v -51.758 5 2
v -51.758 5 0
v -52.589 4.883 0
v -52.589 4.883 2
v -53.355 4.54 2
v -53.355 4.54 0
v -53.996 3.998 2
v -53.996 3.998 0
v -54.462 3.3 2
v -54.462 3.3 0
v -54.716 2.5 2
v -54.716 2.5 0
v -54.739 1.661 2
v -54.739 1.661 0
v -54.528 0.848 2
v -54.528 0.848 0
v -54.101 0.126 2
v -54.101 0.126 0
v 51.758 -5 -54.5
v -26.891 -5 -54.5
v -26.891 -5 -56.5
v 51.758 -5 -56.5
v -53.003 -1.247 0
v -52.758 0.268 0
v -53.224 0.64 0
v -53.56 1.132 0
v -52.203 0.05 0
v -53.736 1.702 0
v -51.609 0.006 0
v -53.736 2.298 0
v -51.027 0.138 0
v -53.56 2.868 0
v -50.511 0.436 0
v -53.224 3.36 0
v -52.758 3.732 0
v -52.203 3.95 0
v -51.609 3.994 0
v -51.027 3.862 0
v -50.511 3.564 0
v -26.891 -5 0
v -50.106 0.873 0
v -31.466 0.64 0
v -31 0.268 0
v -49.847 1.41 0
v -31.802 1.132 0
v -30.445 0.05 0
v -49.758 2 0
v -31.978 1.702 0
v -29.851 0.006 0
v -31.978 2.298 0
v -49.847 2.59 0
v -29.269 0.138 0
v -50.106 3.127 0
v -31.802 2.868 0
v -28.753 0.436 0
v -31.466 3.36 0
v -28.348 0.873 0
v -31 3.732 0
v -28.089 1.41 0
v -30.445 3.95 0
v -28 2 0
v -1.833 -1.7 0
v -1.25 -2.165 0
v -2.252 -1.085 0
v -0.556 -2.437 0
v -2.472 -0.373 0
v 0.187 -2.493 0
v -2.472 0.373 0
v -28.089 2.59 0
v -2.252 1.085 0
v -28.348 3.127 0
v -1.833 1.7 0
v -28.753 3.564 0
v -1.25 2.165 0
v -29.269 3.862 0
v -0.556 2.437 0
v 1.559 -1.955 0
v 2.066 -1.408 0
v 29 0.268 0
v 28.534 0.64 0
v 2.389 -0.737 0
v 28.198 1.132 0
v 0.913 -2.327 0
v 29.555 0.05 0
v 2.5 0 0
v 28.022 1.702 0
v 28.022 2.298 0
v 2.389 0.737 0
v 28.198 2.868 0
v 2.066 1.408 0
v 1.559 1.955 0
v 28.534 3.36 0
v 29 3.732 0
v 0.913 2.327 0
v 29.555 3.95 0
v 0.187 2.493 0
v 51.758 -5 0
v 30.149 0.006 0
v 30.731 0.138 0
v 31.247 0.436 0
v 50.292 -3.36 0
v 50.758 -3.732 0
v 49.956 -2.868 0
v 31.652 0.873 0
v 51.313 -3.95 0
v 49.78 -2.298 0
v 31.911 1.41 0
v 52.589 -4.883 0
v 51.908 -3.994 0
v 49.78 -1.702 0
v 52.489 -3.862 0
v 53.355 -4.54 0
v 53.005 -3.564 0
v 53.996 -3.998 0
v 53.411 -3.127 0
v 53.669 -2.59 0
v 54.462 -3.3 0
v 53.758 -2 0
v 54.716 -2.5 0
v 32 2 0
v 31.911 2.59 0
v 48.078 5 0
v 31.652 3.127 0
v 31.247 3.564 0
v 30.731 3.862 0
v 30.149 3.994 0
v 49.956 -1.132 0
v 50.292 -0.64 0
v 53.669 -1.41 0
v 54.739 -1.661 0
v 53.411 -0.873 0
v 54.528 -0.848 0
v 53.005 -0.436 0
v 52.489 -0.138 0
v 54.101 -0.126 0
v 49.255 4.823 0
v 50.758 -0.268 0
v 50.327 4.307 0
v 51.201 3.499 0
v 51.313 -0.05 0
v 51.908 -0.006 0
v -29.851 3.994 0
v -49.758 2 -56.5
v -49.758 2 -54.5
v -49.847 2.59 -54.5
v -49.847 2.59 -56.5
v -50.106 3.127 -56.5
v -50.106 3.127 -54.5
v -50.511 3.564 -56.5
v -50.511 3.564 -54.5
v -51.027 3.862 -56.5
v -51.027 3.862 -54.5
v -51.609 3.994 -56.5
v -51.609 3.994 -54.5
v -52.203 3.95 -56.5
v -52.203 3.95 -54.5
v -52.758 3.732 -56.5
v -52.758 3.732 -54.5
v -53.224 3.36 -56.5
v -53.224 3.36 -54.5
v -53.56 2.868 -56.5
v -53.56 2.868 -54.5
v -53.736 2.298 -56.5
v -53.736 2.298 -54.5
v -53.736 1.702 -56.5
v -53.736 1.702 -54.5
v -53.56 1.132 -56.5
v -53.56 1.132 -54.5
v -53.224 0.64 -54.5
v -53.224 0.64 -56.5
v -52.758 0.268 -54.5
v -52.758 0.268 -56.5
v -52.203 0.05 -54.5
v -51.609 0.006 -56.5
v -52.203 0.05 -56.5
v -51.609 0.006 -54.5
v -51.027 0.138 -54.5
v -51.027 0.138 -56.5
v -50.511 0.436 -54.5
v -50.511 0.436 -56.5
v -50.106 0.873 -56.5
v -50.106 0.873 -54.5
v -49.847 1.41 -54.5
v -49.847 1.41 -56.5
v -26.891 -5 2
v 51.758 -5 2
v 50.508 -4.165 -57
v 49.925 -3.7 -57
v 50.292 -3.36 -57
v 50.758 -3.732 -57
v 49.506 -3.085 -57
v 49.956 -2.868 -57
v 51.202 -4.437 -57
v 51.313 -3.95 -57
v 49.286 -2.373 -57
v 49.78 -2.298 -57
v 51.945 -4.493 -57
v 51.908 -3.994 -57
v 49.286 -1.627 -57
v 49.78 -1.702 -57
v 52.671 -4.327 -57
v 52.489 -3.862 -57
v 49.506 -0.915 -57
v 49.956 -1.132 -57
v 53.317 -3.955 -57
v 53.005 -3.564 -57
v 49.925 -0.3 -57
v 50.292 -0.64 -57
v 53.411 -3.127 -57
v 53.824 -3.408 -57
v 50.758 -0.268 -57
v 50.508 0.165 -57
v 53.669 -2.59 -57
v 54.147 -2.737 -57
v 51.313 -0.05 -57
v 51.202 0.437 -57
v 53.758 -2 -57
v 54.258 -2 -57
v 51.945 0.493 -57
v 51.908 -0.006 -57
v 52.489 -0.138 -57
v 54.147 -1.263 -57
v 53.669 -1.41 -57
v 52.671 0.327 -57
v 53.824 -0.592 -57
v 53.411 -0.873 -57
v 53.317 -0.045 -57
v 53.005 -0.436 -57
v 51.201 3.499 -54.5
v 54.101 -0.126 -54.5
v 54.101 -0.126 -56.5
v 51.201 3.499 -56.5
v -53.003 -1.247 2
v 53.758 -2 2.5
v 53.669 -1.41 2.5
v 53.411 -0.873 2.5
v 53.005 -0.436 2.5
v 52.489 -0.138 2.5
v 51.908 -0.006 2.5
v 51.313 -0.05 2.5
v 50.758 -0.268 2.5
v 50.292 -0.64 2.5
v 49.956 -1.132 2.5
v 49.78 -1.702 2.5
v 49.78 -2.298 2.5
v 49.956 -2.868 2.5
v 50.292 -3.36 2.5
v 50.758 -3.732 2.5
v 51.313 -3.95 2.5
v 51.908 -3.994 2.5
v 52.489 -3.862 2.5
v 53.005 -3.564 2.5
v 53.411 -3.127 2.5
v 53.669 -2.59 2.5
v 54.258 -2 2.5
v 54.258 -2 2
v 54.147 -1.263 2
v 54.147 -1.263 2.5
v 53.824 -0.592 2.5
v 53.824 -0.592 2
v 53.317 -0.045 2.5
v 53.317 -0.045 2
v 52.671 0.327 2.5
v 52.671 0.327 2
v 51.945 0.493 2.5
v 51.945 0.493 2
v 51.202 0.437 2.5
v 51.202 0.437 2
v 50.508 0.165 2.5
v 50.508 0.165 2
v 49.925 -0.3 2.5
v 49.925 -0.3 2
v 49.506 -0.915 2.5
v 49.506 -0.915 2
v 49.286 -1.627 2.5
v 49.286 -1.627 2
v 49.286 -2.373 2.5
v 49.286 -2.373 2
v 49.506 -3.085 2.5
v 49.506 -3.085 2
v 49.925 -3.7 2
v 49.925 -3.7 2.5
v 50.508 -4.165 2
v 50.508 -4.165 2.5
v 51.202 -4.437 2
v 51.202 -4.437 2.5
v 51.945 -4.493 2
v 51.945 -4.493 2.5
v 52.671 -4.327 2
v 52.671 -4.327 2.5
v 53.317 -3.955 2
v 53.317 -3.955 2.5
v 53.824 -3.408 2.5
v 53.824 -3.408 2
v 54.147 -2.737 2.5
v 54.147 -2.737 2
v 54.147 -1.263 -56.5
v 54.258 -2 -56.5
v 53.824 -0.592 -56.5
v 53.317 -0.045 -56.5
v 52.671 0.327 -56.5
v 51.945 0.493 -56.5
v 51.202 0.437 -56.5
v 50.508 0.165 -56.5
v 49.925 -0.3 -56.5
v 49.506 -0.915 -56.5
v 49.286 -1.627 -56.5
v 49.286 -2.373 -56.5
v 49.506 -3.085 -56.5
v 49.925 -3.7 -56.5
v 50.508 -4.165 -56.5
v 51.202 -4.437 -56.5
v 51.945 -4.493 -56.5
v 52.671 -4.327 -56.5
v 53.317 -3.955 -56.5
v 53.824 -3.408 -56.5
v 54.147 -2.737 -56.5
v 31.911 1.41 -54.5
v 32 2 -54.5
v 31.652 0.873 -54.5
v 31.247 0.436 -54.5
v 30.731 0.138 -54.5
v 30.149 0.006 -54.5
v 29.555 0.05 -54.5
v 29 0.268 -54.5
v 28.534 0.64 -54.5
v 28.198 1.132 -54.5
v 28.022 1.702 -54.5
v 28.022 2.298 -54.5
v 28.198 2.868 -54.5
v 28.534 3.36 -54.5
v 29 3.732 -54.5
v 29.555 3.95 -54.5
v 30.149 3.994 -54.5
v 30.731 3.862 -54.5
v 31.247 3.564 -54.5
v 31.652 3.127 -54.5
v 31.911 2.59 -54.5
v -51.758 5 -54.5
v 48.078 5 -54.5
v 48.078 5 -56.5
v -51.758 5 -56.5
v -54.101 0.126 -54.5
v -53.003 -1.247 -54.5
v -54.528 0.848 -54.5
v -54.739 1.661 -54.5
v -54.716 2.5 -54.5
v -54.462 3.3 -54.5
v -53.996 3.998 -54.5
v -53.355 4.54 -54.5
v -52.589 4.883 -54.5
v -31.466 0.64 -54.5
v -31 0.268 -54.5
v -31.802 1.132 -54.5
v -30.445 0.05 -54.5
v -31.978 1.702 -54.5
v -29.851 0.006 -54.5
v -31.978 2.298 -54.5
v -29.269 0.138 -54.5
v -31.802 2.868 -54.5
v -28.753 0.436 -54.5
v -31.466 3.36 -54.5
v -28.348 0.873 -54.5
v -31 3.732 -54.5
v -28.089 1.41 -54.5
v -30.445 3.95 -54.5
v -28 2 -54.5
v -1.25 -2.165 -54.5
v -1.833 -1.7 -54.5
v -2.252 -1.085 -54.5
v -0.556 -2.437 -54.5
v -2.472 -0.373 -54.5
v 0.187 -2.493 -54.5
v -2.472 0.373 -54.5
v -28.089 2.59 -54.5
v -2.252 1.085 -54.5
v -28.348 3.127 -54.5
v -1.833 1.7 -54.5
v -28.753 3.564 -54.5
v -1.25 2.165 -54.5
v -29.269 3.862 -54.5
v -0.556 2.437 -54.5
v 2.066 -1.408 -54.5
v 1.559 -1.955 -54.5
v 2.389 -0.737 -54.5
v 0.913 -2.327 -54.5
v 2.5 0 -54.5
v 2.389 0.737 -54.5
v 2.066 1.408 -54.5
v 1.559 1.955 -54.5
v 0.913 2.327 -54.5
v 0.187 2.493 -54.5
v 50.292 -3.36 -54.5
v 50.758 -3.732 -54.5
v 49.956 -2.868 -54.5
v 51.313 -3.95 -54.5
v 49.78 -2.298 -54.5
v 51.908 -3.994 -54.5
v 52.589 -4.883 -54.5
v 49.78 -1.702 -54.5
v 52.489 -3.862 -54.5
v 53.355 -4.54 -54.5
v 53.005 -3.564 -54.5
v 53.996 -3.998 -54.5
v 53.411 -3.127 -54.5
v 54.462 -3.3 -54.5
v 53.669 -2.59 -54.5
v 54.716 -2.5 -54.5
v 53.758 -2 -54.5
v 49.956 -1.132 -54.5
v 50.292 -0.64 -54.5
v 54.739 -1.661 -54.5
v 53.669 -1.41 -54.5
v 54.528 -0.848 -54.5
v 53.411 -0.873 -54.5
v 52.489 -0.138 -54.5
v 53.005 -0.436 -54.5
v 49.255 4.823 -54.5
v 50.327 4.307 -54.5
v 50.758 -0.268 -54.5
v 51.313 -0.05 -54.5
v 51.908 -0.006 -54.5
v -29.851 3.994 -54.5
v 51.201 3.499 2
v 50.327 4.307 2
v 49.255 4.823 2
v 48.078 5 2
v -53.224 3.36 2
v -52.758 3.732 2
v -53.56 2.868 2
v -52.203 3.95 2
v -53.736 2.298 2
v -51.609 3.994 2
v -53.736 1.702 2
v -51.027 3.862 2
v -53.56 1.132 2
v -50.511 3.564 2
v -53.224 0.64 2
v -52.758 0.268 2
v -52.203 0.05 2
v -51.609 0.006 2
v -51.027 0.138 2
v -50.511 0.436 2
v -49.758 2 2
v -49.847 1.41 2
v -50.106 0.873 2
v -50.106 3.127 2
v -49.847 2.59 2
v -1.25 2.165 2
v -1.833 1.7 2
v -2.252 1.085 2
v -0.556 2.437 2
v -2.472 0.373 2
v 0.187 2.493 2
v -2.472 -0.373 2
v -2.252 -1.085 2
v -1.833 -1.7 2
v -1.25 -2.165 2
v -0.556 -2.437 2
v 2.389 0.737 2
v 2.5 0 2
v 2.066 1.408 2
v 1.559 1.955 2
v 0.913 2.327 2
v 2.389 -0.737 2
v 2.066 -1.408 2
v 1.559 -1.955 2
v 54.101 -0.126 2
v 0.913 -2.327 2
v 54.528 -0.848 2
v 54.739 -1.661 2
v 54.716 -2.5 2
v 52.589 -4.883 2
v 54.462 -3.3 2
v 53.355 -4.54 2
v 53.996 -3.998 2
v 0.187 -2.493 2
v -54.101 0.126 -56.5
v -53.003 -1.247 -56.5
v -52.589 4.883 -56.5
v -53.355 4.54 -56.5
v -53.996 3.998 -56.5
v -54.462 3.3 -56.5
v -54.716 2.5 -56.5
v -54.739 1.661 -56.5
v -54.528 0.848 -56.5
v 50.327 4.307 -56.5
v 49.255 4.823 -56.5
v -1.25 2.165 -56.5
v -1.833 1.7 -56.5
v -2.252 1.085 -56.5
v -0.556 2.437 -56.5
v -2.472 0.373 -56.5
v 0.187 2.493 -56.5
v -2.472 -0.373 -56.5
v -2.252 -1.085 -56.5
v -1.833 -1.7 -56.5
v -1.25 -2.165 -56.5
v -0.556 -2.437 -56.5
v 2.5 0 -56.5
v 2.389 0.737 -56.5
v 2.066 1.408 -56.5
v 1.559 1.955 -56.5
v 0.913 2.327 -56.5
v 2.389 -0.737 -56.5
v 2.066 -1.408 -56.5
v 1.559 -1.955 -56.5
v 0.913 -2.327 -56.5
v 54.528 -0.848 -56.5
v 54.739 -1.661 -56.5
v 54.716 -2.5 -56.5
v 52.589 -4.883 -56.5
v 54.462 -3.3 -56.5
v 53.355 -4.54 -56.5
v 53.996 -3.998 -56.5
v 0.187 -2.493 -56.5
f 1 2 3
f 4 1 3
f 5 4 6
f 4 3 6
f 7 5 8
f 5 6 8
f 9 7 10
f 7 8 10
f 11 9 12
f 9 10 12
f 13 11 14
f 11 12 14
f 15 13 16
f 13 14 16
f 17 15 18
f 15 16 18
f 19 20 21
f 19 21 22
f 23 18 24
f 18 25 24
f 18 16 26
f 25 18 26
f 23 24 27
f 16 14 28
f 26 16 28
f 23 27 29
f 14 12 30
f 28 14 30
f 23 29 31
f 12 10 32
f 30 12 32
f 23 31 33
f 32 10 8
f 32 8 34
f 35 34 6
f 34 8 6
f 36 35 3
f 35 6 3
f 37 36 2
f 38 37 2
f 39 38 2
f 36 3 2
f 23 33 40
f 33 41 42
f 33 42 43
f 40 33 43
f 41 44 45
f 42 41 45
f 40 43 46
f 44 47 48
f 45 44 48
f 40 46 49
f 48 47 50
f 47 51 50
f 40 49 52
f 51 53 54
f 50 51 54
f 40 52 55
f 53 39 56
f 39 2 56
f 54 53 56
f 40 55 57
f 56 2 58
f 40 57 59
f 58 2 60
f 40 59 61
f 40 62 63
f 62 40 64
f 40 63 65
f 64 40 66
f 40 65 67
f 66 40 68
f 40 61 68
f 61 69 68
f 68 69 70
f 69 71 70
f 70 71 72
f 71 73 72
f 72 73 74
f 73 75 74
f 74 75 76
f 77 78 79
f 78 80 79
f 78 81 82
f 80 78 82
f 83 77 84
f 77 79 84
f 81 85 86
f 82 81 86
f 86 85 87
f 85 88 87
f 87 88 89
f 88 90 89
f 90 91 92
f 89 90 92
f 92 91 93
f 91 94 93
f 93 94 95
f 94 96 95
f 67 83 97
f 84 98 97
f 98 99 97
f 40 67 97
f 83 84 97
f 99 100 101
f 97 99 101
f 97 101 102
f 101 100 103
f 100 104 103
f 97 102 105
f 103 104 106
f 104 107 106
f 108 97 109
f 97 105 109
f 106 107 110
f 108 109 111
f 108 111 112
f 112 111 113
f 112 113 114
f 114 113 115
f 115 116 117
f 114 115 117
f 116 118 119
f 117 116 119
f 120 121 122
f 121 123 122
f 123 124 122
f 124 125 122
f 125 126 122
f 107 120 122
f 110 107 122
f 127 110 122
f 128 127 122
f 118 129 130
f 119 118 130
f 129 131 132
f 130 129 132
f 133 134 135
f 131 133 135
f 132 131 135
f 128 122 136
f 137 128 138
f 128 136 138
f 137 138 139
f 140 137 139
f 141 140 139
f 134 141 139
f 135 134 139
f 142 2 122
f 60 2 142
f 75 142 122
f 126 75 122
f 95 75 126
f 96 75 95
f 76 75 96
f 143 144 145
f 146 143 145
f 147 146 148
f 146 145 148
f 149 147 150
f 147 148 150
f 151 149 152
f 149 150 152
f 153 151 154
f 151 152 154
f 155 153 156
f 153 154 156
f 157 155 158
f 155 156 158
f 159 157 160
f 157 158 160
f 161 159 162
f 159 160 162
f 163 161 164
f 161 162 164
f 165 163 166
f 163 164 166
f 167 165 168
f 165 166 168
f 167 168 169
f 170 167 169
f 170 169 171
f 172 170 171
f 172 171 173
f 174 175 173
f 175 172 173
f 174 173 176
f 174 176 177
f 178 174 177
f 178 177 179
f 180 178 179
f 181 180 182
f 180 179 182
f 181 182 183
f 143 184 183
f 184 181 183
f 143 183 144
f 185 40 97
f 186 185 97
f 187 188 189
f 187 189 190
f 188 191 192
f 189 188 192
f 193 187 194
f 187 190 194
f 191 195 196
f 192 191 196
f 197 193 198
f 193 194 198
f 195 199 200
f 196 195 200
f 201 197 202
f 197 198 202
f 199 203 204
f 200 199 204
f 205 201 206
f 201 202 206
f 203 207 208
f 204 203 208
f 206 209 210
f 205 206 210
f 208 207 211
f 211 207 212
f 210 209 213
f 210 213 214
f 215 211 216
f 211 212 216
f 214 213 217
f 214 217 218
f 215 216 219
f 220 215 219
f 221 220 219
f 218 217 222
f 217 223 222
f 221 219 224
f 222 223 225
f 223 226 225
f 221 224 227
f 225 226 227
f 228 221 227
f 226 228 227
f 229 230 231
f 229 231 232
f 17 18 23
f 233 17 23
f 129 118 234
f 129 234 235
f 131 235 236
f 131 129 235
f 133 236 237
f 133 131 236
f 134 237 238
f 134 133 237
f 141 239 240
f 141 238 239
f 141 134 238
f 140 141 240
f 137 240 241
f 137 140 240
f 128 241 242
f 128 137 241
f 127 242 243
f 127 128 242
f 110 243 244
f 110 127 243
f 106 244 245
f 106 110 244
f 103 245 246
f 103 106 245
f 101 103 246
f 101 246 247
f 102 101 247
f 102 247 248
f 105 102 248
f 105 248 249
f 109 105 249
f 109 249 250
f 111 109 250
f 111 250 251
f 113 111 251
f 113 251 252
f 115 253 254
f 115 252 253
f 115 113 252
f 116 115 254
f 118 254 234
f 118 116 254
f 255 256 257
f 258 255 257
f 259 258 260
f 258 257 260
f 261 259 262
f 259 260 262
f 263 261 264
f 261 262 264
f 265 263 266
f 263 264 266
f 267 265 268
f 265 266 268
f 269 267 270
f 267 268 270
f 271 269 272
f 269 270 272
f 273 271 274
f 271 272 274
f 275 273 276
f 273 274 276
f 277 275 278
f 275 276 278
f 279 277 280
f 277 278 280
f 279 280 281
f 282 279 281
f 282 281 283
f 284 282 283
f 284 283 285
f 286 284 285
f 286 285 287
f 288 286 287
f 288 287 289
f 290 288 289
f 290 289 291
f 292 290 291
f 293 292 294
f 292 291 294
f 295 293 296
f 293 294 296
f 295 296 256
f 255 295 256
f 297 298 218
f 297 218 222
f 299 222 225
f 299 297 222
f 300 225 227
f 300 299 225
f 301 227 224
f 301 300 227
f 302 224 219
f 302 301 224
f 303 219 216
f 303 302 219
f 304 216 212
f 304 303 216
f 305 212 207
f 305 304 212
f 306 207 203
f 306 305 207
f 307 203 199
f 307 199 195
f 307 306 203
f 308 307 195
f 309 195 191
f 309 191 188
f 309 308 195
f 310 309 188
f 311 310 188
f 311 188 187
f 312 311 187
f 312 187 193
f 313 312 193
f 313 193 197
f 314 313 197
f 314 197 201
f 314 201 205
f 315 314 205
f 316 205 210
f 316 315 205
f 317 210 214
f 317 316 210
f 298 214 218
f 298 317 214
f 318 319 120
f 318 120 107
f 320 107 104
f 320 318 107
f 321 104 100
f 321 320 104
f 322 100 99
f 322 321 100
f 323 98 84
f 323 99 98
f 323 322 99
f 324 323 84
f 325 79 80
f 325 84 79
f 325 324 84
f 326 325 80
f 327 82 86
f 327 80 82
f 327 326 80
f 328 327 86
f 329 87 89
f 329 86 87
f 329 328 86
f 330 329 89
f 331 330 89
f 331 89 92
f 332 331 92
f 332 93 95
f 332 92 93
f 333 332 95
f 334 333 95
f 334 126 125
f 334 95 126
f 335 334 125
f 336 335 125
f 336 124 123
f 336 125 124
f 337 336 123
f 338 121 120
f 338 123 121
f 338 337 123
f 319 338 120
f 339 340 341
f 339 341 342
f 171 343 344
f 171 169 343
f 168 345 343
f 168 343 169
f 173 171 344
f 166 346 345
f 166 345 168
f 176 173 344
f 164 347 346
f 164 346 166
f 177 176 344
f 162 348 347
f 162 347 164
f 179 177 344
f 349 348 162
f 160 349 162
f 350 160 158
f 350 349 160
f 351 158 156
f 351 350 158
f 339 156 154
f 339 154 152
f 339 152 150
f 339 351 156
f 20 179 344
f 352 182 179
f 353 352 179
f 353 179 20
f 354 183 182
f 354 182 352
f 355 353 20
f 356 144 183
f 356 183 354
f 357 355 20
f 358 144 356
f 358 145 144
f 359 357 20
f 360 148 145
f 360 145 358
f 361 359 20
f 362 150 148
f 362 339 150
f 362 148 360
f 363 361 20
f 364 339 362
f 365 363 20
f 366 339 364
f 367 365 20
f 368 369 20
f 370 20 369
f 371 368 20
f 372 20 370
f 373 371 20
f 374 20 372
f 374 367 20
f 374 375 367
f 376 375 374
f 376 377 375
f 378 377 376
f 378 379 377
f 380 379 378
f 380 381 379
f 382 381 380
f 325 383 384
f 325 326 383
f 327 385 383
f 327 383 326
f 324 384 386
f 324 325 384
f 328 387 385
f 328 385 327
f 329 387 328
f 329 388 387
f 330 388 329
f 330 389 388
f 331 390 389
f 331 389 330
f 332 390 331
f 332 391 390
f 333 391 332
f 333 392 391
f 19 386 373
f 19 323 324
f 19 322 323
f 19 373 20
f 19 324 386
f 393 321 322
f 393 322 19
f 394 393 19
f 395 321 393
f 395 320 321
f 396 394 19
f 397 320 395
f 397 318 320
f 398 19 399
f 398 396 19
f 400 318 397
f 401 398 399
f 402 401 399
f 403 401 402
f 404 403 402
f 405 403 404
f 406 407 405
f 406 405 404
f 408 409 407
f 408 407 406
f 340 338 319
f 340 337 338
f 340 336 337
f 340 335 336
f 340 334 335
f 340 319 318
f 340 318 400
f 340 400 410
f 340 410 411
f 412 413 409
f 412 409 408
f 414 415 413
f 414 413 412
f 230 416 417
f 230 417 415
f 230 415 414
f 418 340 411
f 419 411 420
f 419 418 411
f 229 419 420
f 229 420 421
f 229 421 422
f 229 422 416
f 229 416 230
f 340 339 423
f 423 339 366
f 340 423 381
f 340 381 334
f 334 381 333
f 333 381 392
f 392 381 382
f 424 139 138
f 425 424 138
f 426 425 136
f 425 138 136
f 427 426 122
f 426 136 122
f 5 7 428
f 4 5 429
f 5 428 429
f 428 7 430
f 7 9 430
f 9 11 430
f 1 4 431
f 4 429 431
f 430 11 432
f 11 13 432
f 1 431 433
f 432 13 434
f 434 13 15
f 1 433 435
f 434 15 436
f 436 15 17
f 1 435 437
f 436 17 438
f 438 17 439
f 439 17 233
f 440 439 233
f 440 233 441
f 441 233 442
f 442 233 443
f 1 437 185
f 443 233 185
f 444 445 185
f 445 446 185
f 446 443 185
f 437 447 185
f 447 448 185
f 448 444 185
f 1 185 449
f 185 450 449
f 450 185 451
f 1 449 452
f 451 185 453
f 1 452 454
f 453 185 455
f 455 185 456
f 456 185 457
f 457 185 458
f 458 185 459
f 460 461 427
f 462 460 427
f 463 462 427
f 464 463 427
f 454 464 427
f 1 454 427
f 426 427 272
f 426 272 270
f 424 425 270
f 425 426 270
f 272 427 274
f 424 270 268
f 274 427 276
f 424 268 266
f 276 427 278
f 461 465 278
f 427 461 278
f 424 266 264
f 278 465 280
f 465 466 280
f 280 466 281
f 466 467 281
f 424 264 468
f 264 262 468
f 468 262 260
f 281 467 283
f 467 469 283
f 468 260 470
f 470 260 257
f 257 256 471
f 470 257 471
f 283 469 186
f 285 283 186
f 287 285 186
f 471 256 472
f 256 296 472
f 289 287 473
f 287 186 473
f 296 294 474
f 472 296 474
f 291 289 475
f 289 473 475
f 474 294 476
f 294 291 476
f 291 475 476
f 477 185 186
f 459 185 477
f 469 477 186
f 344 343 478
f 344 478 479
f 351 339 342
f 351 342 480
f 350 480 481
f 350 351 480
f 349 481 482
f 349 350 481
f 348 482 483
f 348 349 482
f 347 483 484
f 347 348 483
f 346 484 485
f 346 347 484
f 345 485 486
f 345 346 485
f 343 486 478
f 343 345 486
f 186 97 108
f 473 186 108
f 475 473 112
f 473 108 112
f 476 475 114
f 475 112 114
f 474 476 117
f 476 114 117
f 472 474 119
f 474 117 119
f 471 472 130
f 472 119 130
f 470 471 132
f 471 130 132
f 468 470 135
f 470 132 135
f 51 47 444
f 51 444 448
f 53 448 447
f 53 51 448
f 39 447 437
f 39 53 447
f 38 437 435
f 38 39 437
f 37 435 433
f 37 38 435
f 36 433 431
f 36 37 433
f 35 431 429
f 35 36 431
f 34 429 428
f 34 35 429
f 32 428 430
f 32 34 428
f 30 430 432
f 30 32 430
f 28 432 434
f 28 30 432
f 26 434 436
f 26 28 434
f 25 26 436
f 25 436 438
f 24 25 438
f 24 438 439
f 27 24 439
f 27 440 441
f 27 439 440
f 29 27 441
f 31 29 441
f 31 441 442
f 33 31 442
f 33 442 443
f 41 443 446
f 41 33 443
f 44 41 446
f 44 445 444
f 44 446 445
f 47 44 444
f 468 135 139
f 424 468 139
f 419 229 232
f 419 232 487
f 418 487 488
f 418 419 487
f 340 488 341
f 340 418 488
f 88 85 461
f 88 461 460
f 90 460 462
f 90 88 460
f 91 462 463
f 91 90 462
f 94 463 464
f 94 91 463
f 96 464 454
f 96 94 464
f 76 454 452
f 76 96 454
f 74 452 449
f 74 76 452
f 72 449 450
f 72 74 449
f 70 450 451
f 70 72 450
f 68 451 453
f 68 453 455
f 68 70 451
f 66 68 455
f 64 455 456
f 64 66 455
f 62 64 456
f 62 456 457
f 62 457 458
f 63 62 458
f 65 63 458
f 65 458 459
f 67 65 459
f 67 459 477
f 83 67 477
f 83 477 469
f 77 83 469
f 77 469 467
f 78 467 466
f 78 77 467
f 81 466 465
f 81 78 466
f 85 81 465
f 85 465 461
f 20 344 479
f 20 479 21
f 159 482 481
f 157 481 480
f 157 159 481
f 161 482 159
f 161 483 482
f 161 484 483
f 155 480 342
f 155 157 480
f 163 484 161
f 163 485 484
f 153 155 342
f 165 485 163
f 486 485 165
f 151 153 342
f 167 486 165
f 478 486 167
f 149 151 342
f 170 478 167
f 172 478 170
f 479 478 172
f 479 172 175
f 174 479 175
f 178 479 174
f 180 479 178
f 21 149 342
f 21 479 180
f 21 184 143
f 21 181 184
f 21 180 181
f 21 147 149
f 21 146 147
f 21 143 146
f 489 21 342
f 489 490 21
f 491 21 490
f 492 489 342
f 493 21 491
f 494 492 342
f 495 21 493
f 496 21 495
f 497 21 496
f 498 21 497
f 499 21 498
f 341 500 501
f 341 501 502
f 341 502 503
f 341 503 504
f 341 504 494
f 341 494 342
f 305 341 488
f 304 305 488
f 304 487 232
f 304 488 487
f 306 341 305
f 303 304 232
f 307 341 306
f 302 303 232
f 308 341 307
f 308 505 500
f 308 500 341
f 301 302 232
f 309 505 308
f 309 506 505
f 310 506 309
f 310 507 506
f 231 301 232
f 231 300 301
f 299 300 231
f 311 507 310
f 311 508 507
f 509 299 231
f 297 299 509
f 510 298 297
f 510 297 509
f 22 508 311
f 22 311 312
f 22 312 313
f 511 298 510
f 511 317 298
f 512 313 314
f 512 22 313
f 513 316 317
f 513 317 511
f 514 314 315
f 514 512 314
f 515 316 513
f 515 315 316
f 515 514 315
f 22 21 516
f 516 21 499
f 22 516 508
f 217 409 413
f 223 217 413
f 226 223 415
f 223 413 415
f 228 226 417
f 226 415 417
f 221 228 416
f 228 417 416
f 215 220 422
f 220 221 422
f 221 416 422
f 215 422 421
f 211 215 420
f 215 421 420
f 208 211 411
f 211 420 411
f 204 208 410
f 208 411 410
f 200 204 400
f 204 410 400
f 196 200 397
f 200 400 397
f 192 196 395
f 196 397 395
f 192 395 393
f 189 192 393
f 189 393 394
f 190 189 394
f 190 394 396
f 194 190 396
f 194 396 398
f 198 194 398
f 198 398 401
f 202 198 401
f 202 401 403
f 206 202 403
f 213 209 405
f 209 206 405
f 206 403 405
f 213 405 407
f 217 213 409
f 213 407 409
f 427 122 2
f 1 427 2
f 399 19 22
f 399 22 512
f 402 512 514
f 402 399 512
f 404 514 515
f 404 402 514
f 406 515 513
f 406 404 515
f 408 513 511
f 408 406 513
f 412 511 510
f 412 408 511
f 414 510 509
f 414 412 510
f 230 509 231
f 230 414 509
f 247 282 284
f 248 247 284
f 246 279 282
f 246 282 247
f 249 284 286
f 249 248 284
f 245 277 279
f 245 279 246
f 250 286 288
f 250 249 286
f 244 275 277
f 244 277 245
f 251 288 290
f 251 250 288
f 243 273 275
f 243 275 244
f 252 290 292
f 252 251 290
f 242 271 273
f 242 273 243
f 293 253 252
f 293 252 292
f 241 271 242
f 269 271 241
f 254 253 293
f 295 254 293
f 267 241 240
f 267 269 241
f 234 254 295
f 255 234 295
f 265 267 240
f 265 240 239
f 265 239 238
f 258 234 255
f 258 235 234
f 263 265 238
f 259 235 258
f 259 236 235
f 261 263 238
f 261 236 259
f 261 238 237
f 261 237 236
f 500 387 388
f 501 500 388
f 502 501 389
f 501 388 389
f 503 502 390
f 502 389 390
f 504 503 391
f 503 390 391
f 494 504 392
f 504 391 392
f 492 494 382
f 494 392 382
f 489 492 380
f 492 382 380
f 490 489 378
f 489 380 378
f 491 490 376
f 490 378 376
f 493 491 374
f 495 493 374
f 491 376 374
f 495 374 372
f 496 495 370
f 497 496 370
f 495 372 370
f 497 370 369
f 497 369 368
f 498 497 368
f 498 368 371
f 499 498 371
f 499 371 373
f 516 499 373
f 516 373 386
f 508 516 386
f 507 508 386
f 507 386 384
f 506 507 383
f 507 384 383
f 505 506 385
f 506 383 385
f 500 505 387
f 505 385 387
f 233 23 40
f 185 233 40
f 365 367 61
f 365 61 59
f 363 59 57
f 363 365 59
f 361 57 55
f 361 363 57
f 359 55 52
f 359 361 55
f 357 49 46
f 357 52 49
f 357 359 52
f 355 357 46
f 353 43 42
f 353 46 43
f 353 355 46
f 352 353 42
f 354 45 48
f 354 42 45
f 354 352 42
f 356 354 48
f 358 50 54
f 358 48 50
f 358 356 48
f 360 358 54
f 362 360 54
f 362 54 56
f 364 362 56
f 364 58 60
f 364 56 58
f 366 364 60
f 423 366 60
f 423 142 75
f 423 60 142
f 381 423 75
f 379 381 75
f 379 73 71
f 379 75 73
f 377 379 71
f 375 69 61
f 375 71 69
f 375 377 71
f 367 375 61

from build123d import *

# Parameters (mm, degrees)
SKETCH_1_R               = 2.5
EXTRUDE_1_DEPTH          = 2
SKETCH_4_R               = 2.5
EXTRUDE_3_DEPTH          = 0.5
CUT_EXTRUDE_1_DEPTH      = 56.022289153
CUT_EXTRUDE_1_DEPTH_BACK = 56.022289153
SKETCH_2_R               = 2
SKETCH_3_R               = 2
EXTRUDE_2_DEPTH          = 29.25


with BuildPart() as part:
    # 草圖1 → 填料-伸長1 (new body)
    with BuildSketch(Plane.XY):
        with BuildLine():
            Line((-53.002575001, -1.246781249), (-26.890819753, -5))
            Line((-26.890819753, -5), (51.758125458, -5))
            ThreePointArc((51.758125458, -5), (54.462035166, -3.299566191), (54.100731886, -0.125914857))
            Line((54.100731886, -0.125914857), (51.200975848, 3.49878019))
            ThreePointArc((51.200975848, 3.49878019), (49.810255532, 4.605212945), (48.07750061, 5))
            Line((48.07750061, 5), (-51.758125458, 5))
            ThreePointArc((-51.758125458, 5), (-54.462035166, 3.299566191), (-54.100731886, 0.125914857))
            Line((-54.100731886, 0.125914857), (-53.002575001, -1.246781249))
        make_face()
        Circle(SKETCH_1_R, mode=Mode.SUBTRACT)
    extrude(amount=EXTRUDE_1_DEPTH)

    # 草圖4 → 填料-伸長3 (add)
    with BuildSketch(Plane.XY.offset(2)):
        with Locations((51.758125458, -2)):
            Circle(SKETCH_4_R)
    extrude(amount=EXTRUDE_3_DEPTH)

    # 草圖2 → 除料-伸長1 (cut, two sides: drawn at the far end of the back side and taken through both)
    with BuildSketch(Plane.XY.offset(2).offset(-CUT_EXTRUDE_1_DEPTH_BACK)):
        with Locations((-51.758125458, 2)):
            Circle(SKETCH_2_R)
        with Locations((51.758125458, -2)):
            Circle(SKETCH_2_R)
    extrude(amount=CUT_EXTRUDE_1_DEPTH + CUT_EXTRUDE_1_DEPTH_BACK, mode=Mode.SUBTRACT)

    # 草圖3 → 填料-伸長2 (add)
    with BuildSketch(Plane(origin=(0, 0, 2), x_dir=(-1, 0, 0), z_dir=(0, 0, -1))):
        with Locations(Location((30, 2, 0), (0, 0, 180))):
            Circle(SKETCH_3_R)
        with Locations(Location((-30, 2, 0), (0, 0, 180))):
            Circle(SKETCH_3_R)
    extrude(amount=EXTRUDE_2_DEPTH)

    # 鏡射1: part across plane


with BuildPart() as part_1:
    add(part.part)
    add(part.part.mirror(Plane(origin=(-30, 2, -27.25), x_dir=(1, 0, 0), z_dir=(0, 0, -1))))


solid = part_1.part
